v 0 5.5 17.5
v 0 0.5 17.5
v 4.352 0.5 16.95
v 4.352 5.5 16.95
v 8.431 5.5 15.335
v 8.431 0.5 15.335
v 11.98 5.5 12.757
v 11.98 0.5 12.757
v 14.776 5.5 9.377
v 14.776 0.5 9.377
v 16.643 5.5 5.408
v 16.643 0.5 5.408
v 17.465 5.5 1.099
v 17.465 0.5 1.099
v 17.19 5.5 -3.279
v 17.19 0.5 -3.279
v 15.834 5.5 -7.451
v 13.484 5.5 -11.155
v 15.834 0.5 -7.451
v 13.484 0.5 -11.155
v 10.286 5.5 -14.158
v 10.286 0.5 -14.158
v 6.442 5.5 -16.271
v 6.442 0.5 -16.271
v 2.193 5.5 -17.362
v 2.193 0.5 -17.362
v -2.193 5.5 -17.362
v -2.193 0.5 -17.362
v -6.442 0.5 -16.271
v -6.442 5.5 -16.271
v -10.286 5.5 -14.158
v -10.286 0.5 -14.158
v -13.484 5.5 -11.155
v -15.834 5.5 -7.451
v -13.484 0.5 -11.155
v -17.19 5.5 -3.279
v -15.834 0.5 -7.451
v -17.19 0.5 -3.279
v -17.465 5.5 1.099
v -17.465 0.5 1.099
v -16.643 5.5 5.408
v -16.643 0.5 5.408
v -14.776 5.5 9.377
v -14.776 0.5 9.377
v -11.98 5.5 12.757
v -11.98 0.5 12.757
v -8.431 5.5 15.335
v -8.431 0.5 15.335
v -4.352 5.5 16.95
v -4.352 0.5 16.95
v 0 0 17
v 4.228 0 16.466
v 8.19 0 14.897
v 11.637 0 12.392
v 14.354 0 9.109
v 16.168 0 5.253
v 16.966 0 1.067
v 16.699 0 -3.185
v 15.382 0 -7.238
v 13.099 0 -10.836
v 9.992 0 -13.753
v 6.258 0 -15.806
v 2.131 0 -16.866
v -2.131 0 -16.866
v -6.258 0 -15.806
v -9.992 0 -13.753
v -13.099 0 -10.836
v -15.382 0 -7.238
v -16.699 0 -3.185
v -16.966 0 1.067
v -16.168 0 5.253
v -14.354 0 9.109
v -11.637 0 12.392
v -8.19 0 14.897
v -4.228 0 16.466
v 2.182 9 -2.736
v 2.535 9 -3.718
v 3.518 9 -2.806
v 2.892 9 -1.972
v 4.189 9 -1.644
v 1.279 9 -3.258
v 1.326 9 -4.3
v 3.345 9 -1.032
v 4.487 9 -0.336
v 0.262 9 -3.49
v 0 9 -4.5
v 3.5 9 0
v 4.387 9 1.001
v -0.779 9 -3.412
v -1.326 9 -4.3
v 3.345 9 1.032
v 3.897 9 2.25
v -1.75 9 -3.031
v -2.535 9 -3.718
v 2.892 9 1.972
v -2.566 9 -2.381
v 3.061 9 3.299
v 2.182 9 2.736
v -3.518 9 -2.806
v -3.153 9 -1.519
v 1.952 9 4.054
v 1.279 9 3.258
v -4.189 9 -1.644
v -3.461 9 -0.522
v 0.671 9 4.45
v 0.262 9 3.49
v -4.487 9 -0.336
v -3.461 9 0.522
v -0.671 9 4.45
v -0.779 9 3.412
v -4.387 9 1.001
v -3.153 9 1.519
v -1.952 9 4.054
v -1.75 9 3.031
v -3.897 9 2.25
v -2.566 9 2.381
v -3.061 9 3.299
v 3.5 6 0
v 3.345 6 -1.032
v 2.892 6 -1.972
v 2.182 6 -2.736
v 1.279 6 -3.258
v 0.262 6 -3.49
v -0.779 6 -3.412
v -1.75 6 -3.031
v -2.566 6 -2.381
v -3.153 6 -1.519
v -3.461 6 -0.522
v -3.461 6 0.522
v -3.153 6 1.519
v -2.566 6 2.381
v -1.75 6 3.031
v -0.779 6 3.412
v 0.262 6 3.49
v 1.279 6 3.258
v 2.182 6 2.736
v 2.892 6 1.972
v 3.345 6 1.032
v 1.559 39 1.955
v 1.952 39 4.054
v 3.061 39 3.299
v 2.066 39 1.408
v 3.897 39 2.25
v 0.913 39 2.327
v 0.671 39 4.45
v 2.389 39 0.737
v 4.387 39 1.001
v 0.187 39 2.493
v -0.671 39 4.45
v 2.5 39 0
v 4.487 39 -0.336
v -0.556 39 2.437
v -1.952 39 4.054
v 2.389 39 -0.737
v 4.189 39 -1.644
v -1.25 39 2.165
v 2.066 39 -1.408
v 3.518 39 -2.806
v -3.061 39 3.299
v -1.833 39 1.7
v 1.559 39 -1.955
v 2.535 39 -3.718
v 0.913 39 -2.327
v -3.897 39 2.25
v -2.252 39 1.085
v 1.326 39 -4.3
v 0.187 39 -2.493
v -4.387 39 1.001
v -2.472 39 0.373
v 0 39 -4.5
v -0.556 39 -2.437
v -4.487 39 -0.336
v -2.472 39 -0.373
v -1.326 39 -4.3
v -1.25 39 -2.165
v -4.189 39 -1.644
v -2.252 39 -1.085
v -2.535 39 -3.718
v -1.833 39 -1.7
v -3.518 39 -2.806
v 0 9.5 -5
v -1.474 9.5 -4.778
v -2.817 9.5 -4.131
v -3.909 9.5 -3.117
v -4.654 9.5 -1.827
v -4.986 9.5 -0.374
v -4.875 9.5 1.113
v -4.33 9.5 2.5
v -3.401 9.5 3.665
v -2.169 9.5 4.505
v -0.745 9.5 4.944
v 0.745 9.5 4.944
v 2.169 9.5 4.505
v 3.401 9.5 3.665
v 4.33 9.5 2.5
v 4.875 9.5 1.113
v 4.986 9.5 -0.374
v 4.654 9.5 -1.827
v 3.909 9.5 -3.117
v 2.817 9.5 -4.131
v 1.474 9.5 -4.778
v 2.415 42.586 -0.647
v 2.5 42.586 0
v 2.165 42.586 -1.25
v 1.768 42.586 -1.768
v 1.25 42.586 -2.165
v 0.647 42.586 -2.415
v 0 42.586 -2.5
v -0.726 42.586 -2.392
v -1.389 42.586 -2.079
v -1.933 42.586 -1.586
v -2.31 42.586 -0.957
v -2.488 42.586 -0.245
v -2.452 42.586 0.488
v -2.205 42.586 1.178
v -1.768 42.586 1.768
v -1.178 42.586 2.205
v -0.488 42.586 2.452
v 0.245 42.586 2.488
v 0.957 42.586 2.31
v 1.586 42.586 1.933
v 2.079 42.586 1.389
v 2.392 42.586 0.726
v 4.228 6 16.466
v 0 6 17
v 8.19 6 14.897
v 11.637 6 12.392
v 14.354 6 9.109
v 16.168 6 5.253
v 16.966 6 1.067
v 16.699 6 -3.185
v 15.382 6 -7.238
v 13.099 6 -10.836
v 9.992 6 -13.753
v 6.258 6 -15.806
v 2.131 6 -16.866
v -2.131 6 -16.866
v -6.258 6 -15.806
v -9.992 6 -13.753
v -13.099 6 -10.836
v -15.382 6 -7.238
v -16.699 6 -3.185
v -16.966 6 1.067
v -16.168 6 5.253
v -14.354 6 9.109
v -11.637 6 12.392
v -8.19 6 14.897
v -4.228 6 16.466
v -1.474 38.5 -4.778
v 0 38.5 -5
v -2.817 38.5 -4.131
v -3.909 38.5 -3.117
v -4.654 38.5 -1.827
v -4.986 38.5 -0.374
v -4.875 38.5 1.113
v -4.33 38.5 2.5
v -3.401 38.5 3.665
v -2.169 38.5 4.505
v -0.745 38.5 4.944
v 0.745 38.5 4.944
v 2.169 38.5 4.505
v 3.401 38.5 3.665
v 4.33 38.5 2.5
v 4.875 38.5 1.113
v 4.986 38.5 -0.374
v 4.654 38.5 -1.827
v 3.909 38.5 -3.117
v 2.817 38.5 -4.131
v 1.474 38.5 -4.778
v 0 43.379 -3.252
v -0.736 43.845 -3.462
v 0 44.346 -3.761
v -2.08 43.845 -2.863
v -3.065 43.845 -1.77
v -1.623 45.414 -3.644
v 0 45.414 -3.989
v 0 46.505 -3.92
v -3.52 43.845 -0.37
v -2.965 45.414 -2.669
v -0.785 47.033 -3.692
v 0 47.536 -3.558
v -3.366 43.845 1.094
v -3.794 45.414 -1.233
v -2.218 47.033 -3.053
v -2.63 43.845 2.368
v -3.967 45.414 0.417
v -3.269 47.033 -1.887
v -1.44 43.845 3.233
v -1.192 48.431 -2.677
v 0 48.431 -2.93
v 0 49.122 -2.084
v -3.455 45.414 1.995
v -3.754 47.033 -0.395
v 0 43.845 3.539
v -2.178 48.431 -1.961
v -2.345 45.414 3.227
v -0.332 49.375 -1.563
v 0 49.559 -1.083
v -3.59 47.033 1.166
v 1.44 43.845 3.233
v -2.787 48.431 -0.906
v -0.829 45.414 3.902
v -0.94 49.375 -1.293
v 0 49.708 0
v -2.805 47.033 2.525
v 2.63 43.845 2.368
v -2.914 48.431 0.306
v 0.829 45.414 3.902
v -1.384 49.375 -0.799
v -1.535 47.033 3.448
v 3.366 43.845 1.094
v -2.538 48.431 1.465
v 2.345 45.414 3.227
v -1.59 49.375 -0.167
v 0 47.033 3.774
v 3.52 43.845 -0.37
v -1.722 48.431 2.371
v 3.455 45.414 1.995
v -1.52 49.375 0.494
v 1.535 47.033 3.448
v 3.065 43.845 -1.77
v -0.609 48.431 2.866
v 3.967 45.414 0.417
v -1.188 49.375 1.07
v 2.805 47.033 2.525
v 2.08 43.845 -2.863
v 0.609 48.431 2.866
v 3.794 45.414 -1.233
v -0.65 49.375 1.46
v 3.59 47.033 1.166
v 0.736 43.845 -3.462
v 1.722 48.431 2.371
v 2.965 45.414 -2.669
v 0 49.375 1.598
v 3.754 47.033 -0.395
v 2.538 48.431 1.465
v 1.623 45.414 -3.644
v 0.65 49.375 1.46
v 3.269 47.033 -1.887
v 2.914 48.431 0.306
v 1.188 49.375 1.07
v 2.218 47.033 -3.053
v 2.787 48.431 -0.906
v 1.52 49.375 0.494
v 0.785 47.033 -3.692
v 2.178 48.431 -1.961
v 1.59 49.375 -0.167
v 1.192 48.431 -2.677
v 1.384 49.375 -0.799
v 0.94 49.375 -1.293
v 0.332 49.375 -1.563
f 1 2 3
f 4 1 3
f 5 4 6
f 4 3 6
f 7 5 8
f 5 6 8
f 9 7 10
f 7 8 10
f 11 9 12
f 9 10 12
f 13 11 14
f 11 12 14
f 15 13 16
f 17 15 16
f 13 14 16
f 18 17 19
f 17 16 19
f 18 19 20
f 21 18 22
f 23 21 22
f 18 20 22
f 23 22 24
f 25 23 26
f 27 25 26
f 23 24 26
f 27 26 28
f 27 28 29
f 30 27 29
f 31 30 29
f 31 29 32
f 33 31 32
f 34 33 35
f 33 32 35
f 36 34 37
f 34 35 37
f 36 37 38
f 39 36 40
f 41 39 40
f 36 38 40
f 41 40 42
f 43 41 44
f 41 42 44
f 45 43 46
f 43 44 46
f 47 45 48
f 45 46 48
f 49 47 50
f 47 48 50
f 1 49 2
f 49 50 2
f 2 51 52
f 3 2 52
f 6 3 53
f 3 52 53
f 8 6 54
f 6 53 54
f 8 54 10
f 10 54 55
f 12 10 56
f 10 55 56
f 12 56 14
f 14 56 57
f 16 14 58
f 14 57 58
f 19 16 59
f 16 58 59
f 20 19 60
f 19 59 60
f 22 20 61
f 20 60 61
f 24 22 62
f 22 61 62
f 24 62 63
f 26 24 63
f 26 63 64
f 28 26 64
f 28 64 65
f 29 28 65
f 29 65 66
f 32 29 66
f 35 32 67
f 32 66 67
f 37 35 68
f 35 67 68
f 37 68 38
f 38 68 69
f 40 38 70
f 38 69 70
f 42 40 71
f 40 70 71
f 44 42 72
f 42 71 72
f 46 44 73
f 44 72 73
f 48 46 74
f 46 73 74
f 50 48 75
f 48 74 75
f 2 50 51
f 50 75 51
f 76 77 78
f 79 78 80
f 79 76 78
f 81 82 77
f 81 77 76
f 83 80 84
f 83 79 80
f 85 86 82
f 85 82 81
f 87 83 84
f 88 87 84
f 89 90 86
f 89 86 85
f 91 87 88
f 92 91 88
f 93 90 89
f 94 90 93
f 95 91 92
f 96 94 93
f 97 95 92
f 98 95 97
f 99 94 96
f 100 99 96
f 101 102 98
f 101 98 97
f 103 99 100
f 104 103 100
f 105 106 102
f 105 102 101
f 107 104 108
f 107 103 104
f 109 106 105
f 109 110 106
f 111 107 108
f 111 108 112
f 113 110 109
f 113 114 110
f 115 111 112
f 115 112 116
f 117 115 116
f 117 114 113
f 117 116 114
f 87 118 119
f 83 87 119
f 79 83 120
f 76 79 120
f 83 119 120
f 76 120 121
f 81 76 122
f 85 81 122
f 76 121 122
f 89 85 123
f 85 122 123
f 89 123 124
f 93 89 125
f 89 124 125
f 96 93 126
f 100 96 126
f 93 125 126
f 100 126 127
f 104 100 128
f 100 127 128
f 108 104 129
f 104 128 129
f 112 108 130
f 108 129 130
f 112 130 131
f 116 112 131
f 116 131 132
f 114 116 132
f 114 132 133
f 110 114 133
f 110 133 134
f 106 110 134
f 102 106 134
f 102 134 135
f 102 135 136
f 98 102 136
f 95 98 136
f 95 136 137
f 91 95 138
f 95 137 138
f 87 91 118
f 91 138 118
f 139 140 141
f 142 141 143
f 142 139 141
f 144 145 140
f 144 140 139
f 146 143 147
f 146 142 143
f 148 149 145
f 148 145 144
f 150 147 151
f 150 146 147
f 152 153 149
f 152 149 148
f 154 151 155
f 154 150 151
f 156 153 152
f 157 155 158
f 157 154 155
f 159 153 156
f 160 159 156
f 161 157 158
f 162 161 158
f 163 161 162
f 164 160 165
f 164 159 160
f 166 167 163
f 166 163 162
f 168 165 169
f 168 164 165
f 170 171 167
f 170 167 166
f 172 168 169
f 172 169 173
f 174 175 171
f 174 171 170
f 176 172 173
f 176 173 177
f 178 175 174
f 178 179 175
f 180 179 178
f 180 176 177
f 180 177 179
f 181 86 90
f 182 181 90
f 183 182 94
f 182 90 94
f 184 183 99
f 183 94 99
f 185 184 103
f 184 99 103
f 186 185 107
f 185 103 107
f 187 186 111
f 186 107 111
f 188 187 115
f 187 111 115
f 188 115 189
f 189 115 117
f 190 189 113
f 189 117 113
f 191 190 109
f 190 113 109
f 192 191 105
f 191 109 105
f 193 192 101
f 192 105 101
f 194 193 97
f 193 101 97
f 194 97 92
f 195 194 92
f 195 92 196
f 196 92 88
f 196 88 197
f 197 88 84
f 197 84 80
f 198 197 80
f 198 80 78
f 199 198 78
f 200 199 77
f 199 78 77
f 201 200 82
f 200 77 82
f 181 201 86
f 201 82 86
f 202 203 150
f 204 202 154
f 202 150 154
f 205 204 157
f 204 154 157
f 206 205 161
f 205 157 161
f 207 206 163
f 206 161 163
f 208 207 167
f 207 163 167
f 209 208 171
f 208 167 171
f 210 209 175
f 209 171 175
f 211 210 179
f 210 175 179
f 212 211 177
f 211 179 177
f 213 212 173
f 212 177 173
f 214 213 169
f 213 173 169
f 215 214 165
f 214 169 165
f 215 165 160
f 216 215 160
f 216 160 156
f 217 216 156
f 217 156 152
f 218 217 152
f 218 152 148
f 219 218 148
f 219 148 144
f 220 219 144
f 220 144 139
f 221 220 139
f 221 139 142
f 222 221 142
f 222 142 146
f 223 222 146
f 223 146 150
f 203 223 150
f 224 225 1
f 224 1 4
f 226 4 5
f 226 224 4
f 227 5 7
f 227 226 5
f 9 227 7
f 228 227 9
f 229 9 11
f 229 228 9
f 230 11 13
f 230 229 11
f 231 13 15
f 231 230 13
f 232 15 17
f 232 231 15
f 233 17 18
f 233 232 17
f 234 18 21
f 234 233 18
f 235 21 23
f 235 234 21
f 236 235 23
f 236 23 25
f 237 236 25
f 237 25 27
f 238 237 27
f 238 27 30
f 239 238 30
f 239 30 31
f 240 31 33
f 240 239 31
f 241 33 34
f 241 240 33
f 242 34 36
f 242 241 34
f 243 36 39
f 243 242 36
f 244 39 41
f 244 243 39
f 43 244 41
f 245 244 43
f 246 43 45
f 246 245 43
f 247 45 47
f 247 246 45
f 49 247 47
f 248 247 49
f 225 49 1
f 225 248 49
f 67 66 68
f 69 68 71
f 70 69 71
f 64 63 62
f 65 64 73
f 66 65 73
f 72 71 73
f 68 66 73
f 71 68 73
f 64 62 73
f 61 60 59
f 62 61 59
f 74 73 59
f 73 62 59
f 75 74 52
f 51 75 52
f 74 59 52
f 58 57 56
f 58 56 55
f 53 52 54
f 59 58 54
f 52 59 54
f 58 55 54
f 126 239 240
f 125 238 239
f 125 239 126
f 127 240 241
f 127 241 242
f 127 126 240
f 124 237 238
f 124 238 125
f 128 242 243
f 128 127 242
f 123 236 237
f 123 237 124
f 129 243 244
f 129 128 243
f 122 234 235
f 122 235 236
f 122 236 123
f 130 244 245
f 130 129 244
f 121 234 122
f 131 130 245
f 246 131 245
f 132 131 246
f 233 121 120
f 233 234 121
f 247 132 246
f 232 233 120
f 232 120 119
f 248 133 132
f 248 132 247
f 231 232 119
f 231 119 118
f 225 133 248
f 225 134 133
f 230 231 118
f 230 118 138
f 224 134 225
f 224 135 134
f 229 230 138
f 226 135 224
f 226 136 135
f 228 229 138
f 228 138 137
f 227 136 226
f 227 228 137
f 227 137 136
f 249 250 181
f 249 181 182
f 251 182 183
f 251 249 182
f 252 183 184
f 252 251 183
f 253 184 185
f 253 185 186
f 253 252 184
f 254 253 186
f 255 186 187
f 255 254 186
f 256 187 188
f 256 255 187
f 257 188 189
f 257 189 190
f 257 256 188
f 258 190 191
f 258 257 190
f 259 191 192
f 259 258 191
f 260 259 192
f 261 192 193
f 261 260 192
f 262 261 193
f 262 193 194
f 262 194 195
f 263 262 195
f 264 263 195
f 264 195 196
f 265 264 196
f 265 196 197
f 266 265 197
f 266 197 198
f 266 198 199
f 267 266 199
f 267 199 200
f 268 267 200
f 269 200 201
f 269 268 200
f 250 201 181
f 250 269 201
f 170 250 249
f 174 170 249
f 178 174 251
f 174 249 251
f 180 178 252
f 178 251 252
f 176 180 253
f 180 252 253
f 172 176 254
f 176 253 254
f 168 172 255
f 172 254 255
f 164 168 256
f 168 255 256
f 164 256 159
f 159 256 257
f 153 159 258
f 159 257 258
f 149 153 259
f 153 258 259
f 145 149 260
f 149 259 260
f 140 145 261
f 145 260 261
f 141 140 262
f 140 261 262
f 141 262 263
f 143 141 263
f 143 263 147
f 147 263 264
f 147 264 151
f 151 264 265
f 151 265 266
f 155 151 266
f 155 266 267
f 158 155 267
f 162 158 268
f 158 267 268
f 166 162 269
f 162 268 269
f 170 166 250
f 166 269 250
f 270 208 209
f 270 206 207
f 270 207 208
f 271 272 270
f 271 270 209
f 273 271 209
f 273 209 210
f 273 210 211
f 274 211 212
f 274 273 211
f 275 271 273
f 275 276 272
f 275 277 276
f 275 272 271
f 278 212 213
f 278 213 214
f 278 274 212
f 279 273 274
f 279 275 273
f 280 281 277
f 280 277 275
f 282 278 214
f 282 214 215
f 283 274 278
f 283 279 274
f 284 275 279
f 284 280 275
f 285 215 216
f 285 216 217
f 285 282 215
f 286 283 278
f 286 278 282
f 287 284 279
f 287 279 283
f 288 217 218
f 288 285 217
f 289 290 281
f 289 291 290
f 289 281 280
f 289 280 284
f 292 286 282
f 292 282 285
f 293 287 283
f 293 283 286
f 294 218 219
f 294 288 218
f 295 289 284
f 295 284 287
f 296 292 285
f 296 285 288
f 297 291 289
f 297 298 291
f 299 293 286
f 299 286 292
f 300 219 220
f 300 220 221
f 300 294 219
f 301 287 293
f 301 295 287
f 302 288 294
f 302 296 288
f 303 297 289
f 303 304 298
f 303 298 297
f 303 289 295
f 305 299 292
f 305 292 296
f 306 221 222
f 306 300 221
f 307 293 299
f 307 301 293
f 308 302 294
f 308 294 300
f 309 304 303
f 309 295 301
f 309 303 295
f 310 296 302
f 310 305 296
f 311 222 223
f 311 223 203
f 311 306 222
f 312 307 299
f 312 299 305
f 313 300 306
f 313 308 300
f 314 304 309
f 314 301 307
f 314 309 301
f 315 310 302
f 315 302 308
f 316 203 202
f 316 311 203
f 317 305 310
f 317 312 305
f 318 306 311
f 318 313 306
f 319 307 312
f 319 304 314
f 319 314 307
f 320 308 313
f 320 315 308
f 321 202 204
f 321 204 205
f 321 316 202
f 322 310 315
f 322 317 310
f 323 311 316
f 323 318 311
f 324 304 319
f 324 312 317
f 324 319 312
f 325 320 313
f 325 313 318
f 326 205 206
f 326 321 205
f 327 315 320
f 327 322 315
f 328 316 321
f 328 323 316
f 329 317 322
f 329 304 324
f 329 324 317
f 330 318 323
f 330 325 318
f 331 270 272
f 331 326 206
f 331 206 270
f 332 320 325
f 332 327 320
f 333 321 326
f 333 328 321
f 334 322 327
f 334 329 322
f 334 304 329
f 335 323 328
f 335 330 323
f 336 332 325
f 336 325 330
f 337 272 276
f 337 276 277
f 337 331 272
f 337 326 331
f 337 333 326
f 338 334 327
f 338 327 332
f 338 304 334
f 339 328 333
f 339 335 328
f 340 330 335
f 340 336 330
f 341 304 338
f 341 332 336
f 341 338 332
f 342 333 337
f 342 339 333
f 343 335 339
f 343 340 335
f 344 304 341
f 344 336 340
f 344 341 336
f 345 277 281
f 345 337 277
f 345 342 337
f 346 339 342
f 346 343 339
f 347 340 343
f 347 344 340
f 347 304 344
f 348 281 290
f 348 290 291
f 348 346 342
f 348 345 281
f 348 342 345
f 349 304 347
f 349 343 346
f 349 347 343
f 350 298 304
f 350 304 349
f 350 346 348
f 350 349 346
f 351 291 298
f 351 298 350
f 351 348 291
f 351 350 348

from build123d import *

# Parameters (mm, degrees)
SKETCH1_R                = 17.5
BOSS_EXTRUDE1_DEPTH      = 6
CHAMFER1_SIZE            = 0.5
MOVE_START               = 6
MOVE_FACE1_OUTLINE_R     = 3.5
MOVE_FACE1_OUTLINE_R_2   = 2.5
MOVE_FACE1_DEPTH         = 3
MOVE_START_2             = 39
MOVE_FACE1_2_OUTLINE_R   = 2.5
MOVE_FACE1_2_OUTLINE_R_2 = 1.5
MOVE_FACE1_2_DEPTH       = 3.585600344
CHAMFER3_SIZE            = 0.5


# Read off the part's stored shape, not the designer's step: Move Face1
with BuildPart() as part:
    # Sketch1 → Boss-Extrude1 (new body)
    with BuildSketch(Plane(origin=(0, 0, 0), x_dir=(1, 0, 0), z_dir=(0, 1, 0))):
        with Locations(Location((0, 0, 0), (0, 0, 270))):
            Circle(SKETCH1_R)
    extrude(amount=BOSS_EXTRUDE1_DEPTH)

    # Chamfer1
    chamfer1_edges = [part.edges().sort_by_distance(p)[0] for p in [
        (0, 0, -17.5),
        (0, 6, -17.5),
    ]]
    chamfer(chamfer1_edges, length=CHAMFER1_SIZE)

    # Sketch3 → Revolve3 (revolve)
    with BuildSketch(Plane.XY, mode=Mode.PRIVATE) as revolve3_sk:
        with BuildLine():
            Line((-2.5, 6), (-2.5, 9))
            Line((-2.5, 9), (-5, 9))
            Line((-5, 9), (-5, 39))
            Line((-5, 39), (-1.5, 39))
            Line((-1.5, 39), (-1.5, 42))
            ThreePointArc((-1.5, 42), (-3.92634671, 46.472168293), (0, 49.708099244))
            Line((0, 49.708099244), (0, 6))
            Line((0, 6), (-2.5, 6))
        make_face()
    revolve(revolve3_sk.sketch.rotate(Axis((0, 0, 0), (0, 1, 0)), 270), axis=Axis((0, 0, 0), (0, 1, 0)))

    # Move Face1 outline → Move Face1 (add)
    with BuildSketch(Plane(origin=(0, 0, 0), x_dir=(1, 0, 0), z_dir=(0, 1, 0)).offset(MOVE_START)):
        Circle(MOVE_FACE1_OUTLINE_R)
        Circle(MOVE_FACE1_OUTLINE_R_2, mode=Mode.SUBTRACT)
    extrude(amount=MOVE_FACE1_DEPTH)

    # Move Face1 2 outline → Move Face1 2 (add)
    with BuildSketch(Plane(origin=(0, 0, 0), x_dir=(1, 0, 0), z_dir=(0, 1, 0)).offset(MOVE_START_2)):
        Circle(MOVE_FACE1_2_OUTLINE_R)
        Circle(MOVE_FACE1_2_OUTLINE_R_2, mode=Mode.SUBTRACT)
    extrude(amount=MOVE_FACE1_2_DEPTH)

    # Chamfer3
    chamfer3_edges = [part.edges().sort_by_distance(p)[0] for p in [
        (0, 39, 5),
        (0, 9, 5),
    ]]
    chamfer(chamfer3_edges, length=CHAMFER3_SIZE)


solid = part.part
